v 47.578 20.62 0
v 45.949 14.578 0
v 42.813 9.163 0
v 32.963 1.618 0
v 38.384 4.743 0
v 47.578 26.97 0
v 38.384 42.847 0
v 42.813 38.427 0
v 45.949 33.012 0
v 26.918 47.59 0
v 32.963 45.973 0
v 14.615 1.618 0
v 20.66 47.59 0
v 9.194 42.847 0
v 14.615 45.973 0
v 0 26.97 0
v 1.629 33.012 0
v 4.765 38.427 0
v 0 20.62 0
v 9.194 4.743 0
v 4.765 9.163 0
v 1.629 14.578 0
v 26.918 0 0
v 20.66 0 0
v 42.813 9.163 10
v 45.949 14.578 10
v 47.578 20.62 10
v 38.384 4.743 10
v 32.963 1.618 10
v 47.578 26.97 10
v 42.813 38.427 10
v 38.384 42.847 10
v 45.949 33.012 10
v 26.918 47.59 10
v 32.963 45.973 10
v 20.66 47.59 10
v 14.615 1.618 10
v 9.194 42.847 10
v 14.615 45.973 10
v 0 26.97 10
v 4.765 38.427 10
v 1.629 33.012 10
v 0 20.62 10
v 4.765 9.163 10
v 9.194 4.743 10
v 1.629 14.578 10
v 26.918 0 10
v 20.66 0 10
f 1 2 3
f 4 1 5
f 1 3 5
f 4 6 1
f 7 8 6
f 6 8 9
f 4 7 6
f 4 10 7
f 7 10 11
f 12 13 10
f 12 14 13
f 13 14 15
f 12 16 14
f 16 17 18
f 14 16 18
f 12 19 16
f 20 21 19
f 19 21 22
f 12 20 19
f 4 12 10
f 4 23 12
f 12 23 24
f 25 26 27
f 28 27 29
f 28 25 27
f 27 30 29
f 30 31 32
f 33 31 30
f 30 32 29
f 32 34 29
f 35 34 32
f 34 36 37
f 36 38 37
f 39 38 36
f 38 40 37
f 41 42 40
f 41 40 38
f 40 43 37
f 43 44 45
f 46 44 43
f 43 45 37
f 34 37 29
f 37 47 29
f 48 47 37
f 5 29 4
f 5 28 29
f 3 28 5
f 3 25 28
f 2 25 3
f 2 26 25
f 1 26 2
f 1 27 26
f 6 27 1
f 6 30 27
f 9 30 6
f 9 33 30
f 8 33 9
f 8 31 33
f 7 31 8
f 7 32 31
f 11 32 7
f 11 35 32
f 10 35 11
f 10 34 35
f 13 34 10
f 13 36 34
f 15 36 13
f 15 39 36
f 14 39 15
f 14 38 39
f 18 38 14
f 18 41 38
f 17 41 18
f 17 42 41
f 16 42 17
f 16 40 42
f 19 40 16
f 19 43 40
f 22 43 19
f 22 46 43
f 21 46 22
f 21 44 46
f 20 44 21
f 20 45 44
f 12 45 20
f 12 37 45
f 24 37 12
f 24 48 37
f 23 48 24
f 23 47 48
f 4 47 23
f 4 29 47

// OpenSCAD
$fn = 32;

// ----------------------------------------------------------------------
// Flat adaptor: double_d, 10 mm thick
// ----------------------------------------------------------------------

// --- parameters (mm) ---
profile_height = 10;      // extrusion height
profile_points = 24;      // points of the closed outline

profile = [[47.578, 26.97], [45.949, 33.012], [42.813, 38.427], [38.384, 42.847], [32.963, 45.973], [26.918, 47.59], [20.66, 47.59], [14.615, 45.973], [9.194, 42.847], [4.765, 38.427], [1.629, 33.012], [0, 26.97], [0, 20.62], [1.629, 14.578], [4.765, 9.163], [9.194, 4.743], [14.615, 1.618], [20.66, 0], [26.918, 0], [32.963, 1.618], [38.384, 4.743], [42.813, 9.163], [45.949, 14.578], [47.578, 20.62]];  // single closed polygon, 24 points, counter clockwise

// --- the one profile operation ---
linear_extrude(height = profile_height) polygon(points = profile);
